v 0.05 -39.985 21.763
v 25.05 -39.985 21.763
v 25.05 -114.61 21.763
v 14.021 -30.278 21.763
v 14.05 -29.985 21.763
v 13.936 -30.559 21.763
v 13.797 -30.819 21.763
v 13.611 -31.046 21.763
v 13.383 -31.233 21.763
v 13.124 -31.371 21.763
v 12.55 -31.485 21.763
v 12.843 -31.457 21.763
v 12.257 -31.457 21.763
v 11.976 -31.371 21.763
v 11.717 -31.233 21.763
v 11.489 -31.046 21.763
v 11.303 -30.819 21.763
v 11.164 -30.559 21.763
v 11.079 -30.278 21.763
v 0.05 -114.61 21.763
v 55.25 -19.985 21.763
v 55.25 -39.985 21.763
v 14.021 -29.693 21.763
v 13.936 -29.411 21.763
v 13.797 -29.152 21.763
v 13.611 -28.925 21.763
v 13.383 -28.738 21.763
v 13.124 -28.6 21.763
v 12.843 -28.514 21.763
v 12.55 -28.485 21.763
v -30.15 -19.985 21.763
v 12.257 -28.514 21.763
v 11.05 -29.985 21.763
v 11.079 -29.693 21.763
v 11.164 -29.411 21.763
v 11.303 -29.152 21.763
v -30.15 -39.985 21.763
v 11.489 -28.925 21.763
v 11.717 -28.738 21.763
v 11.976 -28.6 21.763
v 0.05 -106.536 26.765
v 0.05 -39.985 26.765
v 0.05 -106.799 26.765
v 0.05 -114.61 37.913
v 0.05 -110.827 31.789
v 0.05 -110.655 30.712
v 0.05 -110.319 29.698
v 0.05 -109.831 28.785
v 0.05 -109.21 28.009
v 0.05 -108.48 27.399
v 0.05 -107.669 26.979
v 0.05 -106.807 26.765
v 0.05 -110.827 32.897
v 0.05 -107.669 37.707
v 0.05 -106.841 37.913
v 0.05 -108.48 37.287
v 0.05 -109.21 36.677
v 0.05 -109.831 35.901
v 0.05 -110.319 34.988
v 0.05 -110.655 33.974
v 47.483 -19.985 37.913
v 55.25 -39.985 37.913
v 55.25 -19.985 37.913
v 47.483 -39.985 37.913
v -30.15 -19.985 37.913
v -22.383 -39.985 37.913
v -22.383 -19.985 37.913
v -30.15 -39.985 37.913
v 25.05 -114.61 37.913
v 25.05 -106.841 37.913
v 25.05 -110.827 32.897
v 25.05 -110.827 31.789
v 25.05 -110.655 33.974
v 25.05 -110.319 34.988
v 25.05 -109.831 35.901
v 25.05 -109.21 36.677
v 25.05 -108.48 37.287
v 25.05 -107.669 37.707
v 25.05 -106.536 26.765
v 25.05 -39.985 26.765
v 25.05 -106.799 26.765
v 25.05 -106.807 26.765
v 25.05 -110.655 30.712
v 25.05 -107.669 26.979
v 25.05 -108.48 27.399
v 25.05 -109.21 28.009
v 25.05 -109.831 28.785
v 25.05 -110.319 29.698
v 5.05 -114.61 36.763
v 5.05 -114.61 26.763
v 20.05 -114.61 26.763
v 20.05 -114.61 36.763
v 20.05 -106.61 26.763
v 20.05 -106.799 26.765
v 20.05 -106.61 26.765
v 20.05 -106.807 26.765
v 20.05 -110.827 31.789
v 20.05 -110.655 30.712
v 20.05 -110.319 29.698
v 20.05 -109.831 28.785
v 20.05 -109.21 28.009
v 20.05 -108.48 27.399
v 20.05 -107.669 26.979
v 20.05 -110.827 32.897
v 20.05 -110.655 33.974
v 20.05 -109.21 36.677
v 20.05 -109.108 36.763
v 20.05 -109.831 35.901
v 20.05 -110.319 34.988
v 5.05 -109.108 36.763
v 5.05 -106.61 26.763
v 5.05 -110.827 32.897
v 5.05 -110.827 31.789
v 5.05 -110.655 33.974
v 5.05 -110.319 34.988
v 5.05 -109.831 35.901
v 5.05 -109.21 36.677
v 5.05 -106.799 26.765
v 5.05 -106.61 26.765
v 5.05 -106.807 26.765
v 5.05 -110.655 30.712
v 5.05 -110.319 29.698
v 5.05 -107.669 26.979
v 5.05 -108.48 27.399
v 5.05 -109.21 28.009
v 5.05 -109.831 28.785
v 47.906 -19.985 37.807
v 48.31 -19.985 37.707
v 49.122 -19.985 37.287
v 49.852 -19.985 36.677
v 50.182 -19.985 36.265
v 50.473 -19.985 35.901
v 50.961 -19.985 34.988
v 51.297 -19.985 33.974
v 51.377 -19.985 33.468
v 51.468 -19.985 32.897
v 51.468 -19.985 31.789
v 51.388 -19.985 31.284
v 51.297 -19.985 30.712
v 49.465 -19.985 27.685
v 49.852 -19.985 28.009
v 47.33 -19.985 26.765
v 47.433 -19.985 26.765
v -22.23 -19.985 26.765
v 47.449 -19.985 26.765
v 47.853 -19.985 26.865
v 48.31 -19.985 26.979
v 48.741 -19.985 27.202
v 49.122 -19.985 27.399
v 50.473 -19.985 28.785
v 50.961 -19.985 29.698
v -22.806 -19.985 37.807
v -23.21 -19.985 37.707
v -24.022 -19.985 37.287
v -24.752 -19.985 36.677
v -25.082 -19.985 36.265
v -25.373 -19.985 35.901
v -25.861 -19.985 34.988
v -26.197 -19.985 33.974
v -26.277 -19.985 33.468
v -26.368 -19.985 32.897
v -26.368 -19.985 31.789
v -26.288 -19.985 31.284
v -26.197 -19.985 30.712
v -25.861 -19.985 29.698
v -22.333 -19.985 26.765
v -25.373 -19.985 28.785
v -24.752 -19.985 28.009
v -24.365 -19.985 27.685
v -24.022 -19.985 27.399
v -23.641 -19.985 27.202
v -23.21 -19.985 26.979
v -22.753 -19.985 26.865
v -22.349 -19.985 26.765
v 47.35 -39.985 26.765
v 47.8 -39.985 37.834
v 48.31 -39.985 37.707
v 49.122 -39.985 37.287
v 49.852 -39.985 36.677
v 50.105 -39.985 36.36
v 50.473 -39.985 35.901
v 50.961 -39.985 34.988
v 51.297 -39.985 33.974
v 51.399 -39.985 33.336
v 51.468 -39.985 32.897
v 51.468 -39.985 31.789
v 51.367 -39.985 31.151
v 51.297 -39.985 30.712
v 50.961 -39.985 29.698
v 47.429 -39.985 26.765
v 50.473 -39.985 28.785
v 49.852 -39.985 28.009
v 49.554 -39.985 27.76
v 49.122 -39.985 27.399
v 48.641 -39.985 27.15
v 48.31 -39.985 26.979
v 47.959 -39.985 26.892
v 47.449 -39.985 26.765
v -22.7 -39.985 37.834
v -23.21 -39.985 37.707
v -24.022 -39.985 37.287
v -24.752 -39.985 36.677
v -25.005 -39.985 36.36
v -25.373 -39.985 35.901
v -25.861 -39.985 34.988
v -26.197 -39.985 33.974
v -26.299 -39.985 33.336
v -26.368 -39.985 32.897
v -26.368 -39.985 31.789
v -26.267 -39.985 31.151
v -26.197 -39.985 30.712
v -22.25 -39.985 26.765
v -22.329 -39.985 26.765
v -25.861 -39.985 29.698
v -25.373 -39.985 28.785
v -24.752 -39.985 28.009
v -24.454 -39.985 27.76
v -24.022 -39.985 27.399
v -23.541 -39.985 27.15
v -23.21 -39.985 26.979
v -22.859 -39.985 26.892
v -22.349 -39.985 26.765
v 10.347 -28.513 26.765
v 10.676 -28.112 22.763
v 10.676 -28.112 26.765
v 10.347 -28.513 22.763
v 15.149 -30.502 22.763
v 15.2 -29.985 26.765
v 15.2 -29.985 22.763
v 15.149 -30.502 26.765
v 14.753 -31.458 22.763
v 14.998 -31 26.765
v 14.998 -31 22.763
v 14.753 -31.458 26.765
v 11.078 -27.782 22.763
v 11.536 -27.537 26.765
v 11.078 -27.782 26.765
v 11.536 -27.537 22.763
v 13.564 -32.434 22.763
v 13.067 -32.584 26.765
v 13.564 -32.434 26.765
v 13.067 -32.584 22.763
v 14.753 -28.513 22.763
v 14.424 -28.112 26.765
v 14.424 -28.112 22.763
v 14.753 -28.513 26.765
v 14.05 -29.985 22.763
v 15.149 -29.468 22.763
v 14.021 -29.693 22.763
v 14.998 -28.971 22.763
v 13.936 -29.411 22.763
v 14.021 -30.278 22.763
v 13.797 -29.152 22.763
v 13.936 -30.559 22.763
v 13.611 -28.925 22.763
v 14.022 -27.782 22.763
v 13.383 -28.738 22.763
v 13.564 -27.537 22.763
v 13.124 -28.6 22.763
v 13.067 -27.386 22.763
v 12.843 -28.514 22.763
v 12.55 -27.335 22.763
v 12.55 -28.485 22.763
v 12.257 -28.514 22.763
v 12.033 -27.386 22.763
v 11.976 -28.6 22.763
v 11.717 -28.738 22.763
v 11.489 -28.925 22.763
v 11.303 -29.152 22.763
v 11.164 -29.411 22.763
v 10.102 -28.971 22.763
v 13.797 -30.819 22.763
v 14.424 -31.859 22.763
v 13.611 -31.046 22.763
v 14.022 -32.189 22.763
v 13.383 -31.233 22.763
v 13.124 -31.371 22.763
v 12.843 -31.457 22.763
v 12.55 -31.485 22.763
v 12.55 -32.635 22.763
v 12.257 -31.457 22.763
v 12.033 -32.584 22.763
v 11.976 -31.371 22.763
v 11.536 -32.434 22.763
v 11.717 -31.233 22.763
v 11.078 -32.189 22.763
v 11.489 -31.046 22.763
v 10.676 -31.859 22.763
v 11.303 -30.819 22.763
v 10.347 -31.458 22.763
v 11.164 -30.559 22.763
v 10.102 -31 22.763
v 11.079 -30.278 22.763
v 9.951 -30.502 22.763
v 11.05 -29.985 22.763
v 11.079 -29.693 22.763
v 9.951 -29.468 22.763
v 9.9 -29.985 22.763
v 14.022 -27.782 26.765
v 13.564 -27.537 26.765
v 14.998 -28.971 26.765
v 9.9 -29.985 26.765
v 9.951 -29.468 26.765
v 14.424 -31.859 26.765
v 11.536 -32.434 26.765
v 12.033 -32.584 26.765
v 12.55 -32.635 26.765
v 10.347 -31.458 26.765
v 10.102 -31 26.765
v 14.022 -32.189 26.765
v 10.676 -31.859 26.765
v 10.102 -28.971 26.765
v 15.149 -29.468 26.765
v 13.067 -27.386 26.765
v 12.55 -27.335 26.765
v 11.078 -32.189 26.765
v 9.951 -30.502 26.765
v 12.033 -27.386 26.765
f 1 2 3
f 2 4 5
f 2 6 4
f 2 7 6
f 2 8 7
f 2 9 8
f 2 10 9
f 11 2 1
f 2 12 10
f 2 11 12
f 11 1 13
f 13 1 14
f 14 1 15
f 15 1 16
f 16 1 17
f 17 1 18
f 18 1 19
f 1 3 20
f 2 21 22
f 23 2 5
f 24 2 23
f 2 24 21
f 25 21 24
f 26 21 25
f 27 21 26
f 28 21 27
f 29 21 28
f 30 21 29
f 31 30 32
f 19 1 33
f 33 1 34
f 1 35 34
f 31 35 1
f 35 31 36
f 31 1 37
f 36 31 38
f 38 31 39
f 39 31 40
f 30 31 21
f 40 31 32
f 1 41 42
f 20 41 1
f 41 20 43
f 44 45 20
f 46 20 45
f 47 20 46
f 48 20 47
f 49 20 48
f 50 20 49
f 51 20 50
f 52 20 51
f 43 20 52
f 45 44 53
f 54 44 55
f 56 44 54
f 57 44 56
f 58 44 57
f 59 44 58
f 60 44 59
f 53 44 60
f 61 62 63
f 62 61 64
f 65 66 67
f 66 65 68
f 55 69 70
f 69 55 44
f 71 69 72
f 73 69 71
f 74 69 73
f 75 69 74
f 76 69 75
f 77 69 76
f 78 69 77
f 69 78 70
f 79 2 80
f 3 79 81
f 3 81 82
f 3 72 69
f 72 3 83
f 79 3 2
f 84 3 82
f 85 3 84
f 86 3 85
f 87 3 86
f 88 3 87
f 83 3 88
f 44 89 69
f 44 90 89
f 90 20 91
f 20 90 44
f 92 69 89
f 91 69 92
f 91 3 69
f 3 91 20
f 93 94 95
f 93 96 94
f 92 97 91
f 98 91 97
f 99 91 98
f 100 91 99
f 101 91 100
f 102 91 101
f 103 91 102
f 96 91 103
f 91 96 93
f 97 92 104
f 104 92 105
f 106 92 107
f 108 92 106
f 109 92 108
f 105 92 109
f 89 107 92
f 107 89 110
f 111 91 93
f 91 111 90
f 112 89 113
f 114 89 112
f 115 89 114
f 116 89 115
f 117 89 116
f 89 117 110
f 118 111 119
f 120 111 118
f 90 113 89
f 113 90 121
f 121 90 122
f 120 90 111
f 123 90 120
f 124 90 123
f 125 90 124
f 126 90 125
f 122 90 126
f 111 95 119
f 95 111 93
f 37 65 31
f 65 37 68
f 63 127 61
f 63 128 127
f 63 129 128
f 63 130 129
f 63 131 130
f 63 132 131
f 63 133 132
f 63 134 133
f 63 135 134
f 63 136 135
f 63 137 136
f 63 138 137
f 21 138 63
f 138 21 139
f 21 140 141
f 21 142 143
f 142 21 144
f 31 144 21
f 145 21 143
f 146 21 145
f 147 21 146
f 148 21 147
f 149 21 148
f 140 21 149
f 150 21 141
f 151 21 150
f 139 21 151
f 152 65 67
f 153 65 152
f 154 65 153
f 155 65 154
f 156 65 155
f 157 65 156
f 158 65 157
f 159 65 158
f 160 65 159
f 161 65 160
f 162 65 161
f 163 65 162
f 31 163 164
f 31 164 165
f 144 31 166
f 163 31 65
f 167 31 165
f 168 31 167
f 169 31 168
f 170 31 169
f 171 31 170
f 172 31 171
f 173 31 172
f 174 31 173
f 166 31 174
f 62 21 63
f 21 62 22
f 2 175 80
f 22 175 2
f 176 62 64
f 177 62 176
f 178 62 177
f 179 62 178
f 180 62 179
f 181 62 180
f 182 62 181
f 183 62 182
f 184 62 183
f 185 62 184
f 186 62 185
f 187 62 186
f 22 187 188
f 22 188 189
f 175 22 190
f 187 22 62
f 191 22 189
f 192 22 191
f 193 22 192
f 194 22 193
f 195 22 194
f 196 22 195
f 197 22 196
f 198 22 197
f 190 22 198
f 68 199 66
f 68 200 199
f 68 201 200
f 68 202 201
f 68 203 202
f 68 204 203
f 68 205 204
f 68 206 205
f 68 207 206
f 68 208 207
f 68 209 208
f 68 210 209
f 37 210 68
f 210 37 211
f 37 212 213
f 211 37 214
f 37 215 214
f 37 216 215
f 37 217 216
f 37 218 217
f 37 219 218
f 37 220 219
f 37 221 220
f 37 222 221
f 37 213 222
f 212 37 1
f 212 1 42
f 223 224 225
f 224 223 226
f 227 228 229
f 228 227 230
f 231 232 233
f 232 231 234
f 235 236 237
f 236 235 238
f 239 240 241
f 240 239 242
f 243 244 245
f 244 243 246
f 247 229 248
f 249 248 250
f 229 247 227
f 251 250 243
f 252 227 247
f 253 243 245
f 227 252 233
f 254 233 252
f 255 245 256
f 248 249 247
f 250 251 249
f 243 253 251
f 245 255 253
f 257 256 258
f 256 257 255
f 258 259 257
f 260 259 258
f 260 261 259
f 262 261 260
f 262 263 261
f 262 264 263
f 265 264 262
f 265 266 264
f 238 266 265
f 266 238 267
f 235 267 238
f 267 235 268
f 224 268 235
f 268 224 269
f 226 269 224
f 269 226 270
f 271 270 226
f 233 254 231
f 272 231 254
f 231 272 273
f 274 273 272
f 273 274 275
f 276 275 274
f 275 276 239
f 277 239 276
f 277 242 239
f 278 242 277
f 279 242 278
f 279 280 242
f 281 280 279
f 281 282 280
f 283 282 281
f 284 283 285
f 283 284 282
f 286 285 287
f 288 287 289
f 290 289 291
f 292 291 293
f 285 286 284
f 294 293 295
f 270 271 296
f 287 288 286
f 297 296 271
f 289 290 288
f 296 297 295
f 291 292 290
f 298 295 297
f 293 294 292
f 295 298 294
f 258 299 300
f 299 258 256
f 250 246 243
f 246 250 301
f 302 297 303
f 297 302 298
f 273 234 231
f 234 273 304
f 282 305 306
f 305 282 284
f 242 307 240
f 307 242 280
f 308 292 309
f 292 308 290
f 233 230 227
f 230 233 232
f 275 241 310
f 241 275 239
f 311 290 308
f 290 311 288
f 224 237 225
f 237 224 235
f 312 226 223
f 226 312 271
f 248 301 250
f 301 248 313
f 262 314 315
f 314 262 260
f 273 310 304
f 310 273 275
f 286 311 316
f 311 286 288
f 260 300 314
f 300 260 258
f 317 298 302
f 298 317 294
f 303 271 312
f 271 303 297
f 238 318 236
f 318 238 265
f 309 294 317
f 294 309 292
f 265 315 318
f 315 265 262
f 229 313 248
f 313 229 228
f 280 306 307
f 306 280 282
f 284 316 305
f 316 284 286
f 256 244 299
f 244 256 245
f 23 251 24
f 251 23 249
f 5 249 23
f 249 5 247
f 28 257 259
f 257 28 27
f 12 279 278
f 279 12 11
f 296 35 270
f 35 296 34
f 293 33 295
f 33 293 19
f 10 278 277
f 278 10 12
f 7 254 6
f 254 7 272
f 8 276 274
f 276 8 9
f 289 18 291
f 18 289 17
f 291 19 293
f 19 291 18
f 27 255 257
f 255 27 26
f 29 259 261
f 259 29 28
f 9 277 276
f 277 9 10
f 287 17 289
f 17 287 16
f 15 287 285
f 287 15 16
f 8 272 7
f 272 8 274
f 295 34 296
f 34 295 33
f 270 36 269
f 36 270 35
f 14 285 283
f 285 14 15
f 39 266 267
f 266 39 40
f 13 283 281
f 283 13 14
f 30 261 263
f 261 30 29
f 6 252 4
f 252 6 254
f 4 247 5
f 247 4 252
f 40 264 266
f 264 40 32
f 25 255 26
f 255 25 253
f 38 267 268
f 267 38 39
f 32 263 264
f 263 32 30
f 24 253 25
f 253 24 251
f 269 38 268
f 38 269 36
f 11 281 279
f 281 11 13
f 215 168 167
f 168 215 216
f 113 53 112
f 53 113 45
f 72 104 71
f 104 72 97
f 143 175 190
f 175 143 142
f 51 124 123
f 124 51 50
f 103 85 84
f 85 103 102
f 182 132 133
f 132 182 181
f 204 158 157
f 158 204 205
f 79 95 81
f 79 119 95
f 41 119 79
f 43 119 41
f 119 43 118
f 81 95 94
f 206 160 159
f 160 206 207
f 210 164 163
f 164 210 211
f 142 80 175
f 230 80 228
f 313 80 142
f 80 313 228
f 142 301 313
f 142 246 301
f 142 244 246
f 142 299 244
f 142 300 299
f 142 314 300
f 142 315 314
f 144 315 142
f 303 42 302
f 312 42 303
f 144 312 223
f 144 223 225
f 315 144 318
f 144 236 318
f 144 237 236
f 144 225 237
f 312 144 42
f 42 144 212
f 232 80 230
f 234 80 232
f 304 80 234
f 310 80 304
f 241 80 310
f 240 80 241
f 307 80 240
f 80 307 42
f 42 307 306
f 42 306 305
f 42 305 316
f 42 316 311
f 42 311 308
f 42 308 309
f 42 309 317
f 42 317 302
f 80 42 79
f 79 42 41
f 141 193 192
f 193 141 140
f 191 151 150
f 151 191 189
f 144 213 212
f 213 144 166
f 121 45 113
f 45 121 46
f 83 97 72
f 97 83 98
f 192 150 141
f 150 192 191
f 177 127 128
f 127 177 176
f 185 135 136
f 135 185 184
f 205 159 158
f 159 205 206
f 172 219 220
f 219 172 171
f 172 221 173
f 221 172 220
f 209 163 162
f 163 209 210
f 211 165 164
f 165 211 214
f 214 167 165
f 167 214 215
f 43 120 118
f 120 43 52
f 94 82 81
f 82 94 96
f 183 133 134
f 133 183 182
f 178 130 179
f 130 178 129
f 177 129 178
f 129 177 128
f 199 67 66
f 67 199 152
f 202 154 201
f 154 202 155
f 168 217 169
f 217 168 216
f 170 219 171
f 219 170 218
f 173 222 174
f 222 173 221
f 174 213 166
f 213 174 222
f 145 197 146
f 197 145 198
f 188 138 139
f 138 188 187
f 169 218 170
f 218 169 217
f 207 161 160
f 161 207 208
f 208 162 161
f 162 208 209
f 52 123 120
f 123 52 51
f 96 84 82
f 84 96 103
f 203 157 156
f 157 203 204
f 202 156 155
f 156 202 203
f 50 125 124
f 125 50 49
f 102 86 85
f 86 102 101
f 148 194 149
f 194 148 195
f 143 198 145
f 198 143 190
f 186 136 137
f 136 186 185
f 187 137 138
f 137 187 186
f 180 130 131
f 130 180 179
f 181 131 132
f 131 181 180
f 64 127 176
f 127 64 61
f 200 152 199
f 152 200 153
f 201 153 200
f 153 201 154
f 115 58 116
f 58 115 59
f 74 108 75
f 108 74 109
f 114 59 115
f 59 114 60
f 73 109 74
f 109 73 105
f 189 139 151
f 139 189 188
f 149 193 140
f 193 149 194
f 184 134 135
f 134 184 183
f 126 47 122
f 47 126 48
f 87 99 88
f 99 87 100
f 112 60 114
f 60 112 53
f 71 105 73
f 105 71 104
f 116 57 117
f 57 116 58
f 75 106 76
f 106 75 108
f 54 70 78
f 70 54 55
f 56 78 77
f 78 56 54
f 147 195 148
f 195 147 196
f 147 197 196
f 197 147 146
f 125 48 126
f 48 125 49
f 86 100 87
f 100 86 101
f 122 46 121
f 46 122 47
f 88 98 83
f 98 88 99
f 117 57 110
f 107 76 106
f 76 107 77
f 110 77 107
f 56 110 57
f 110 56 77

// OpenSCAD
// Bike Phone Holder

$fn = 32;

grip_spacing = 0.04; // The amount of spacing to take out in grip spots
shaft_len = 97.5;
shaft_dia = 32.0-grip_spacing*2;
t_inner_dia = 25.2-grip_spacing*2;
t_outer_dia = 22.2-grip_spacing*2;
t_half_len = 80.4; // Eyeballed O.O
t_grabber_dia = 32.5;
t_grabber_len = 40.2;

phone_len = 167.25;
phone_wid = 77.4-4.0;//79.0;
phone_h = 11.2;//13.2;
phone_grabber_thick = 4.0;
phone_grabber_bottom_thick = 5.0;
phone_edge_scale = 0.8;
phone_grabber_brace_wid = 20.0;
phone_angle = 2;
phone_clips_dist = 0.0;

clips_grabber_dist = 5.0;
clip_thick = 6.8;
screw_ledge_thick = 2.0;


module shaftOutline2D() {
    translate([0,-shaft_len/2-t_grabber_dia/2])
    square([shaft_dia, shaft_len], center=true);
}
//shaftOutline2D();

module shaft() {
    rotate([90,0,0])
    cylinder(d=shaft_dia, h=shaft_len+t_grabber_dia/2);
}
//shaft();

module tArm() {
    rotate([0,90,0])
    translate([0,0,t_grabber_len/2])
    cylinder(d1=t_inner_dia, d2=t_outer_dia, h=t_half_len-t_grabber_len/2);
}
//t_arm();

module tGrabber() {
    rotate([0,90,0])
    translate([0,0,-t_grabber_len/2])
    cylinder(d=t_grabber_dia, h=t_grabber_len);
}

module t() {
    tGrabber();
    tArm();
    rotate([0,0,180])
    tArm();
    shaft();
}
//projection()
//t();

module phone() {
    rotate([phone_angle,0,0])
    minkowski() {
    translate([0,0,shaft_dia/2+clip_thick+phone_h/2+0.005])
    linear_extrude(0.01)
    translate([(t_grabber_len/2+clips_grabber_dist)/2,-(shaft_len+t_grabber_dia/2)+phone_len/2])
    rotate([0,0,90])
    square([phone_len-(phone_edge_scale*phone_h/2), phone_wid-(phone_edge_scale*phone_h/2)], center=true);
    scale([phone_edge_scale,phone_edge_scale,1])
    sphere(d=phone_h);
    }
}
//phone();

module shaftClip2D() {
    translate([0,-shaft_dia/2-t_grabber_dia/2-shaft_clip_grabber_dist])
    square([shaft_dia+2*clip_thick-grip_spacing*2, shaft_dia], center=true);
}
//#shaftClip2D();

module shaftClipUncut() {
    translate([0,-shaft_dia/2-t_grabber_dia/2-clips_grabber_dist])
    rotate([90,0,0])
    translate([0,0,-shaft_dia/2])
    cylinder(d=shaft_dia+2*clip_thick, h=shaft_dia);
}
//shaftClipUncut();

/* Removed because hulling solids and then diffing at once later seemed easier
module shaftClip() {
    difference() {
        shaftClipUncut();
        translate([0,-shaft_dia/2-t_grabber_dia/2-shaft_clip_grabber_dist, -shaft_dia/2])
        rotate([0,45,0])
        #cube(shaft_dia, center=true);
    }
}*/
//shaftClip();

module tClipUncut() {
    translate([t_inner_dia/2+t_grabber_len/2+clips_grabber_dist,0,0])
    rotate([0,90,0])
    translate([0,0,-t_inner_dia/2])
    cylinder(d=t_grabber_dia+2*clip_thick, h=t_inner_dia);
}
//tClipUncut();

module clipConnectingCurve() {
    small_fix = 0.25; // For some reason some things are off
    linear_extrude(t_grabber_dia/2+clip_thick)
    difference() {
        offset(-clips_grabber_dist) offset(clips_grabber_dist)
        offset(t_inner_dia/2-0.005)
        polygon([
            [0, -shaft_dia/2-t_grabber_dia/2-clips_grabber_dist+0.005+(t_grabber_dia-t_inner_dia)/2-small_fix],
            [t_grabber_len/2+clips_grabber_dist+t_inner_dia/2+0.005, -shaft_dia/2-t_grabber_dia/2-clips_grabber_dist+0.005+(t_grabber_dia-t_inner_dia)/2-small_fix],
            [t_grabber_len/2+clips_grabber_dist+t_inner_dia/2+0.005, 0],
            [t_grabber_len/2+clips_grabber_dist+t_inner_dia/2-0.005, 0],
            [t_grabber_len/2+clips_grabber_dist+t_inner_dia/2-0.005, -shaft_dia/2-t_grabber_dia/2-clips_grabber_dist-0.005-(t_grabber_dia-t_inner_dia)/2+small_fix],
            [0, -shaft_dia/2-t_grabber_dia/2-clips_grabber_dist-0.005-(t_grabber_dia-t_inner_dia)/2+small_fix]
        ]);
        square(t_grabber_len/2+clips_grabber_dist+t_inner_dia);
        rotate([0,0,180])
        square(shaft_dia/2+t_grabber_dia+clips_grabber_dist);
    }
}
//clipConnectingCurve();

module uncutClipInterface() {
    shaftClipUncut();
    tClipUncut();
    clipConnectingCurve();
}

m3_shaft_len = 10.0;
m3_shaft_dia = 3.0;
m3_head_dia = 5.3;
m3_head_len = 3.0+20.0;
m3_nut_h = 2.4;
m3_nut_len = 5.55;
m3_nut_hole_len = 5.0;
module m3_screw(head_len=m3_head_len) {
    translate([0,0,-m3_shaft_len])
    union() {
    translate([0,0,m3_shaft_len])
    linear_extrude(head_len)
    circle(m3_head_dia/2);
    linear_extrude(m3_shaft_len)
    circle(m3_shaft_dia/2);
    //rotate([90,-90,0])
    //translate([m3_nut_h/2,0,-m3_nut_len/2])
    //#linear_extrude(m3_nut_len)
    //square([m3_nut_h,m3_nut_len+m3_nut_hole_len],center=true);
    }
}

module screwHoles() {
    translate([0,0,screw_ledge_thick]) {
        translate([t_inner_dia/2+t_grabber_len/2+clips_grabber_dist,t_outer_dia/2+clip_thick,0])
        m3_screw();
        translate([t_inner_dia/2+t_grabber_len/2+clips_grabber_dist,-t_outer_dia/2-clip_thick,0])
        m3_screw();
        translate([shaft_dia/2+clip_thick/2,-shaft_dia/2-t_grabber_dia/2-clips_grabber_dist])
        m3_screw();
        translate([-shaft_dia/2-clip_thick/2,-shaft_dia/2-t_grabber_dia/2-clips_grabber_dist])
        m3_screw();
    }
}

module diffCube() {
    translate([0,0,-100])
    cube(200, center=true);
}

module phoneGrabberScrewHole() {
    translate([0,0,phone_grabber_bottom_thick-3+screw_ledge_thick])
    rotate([phone_angle, 0, 0])
    translate([0,0,shaft_dia/2+clip_thick+phone_h/2+0.005-phone_h/2-phone_grabber_thick])
    translate([(t_grabber_len/2+clips_grabber_dist)/2,-(shaft_len+t_grabber_dia/2)+phone_len/2])
    m3_screw();
}
//#phoneGrabberScrewHole();

module clipsUpper() {
    difference() {
        uncutClipInterface();
        t();
        diffCube();
        screwHoles();
        phone();
        phoneGrabberScrewHole();
    }
}

module shaftClipLower() {
    difference() {
        intersection() {
            shaftClipUncut();
            diffCube();
        }
        screwHoles();
        t();
    }
}

module tClipLower() {
    difference() {
        intersection() {
            tClipUncut();
            diffCube();
        }
        screwHoles();
        t();
    }
}

module phoneGrabber() {
    translate([0,0,phone_clips_dist+phone_grabber_thick])
    difference() {
        rotate([phone_angle, 0, 0])
        translate([0,0,shaft_dia/2+clip_thick+phone_h/2+0.005-phone_h/2-phone_grabber_thick])
        translate([(t_grabber_len/2+clips_grabber_dist)/2,-(shaft_len+t_grabber_dia/2)+phone_len/2]) {
            translate([0,0,phone_grabber_thick-phone_grabber_bottom_thick])
            linear_extrude(phone_h+phone_grabber_bottom_thick-0.05)
            square([phone_wid+3*phone_grabber_thick, phone_grabber_brace_wid], center=true);
            translate([0,-phone_len/4,phone_grabber_thick-phone_grabber_bottom_thick])
            difference() {
                linear_extrude(phone_h+phone_grabber_bottom_thick-0.05)
                square([phone_grabber_brace_wid*1.25, phone_len/2+3*phone_grabber_thick-10], center=true);
                translate([0,-(phone_len/2+3*phone_grabber_thick-10)/2+3])
                translate([0,0,10])
                cube([15,10,10], center=true);
            }
            translate([0,-m3_shaft_dia*2,-phone_clips_dist])
            linear_extrude(phone_clips_dist)
            square([phone_grabber_brace_wid, phone_grabber_brace_wid*1.5], center=true);
        }
        translate([0,5,0.15])
        phone();
        translate([0,0,-phone_clips_dist-phone_grabber_thick])
        phoneGrabberScrewHole();
    }
}

module viewSetup() {
    color("cyan")
    translate([0,5,0.15])
    translate([0,0,phone_clips_dist+phone_grabber_thick+1])
    phone();
    translate([0,0,-5])
    shaftClipLower();
    translate([0,0,-5])
    tClipLower();
    translate([0,0,1])
    phoneGrabber();
    color("orange")
    clipsUpper();
    color("green")
    translate([0,0,-2.5])
    t();
}
//viewSetup();

module printablePhoneGrabber() {
    rotate([-phone_angle,0,0])
    phoneGrabber();
}
printablePhoneGrabber();
//clipsUpper();
//shaftClipLower();
//tClipLower();
